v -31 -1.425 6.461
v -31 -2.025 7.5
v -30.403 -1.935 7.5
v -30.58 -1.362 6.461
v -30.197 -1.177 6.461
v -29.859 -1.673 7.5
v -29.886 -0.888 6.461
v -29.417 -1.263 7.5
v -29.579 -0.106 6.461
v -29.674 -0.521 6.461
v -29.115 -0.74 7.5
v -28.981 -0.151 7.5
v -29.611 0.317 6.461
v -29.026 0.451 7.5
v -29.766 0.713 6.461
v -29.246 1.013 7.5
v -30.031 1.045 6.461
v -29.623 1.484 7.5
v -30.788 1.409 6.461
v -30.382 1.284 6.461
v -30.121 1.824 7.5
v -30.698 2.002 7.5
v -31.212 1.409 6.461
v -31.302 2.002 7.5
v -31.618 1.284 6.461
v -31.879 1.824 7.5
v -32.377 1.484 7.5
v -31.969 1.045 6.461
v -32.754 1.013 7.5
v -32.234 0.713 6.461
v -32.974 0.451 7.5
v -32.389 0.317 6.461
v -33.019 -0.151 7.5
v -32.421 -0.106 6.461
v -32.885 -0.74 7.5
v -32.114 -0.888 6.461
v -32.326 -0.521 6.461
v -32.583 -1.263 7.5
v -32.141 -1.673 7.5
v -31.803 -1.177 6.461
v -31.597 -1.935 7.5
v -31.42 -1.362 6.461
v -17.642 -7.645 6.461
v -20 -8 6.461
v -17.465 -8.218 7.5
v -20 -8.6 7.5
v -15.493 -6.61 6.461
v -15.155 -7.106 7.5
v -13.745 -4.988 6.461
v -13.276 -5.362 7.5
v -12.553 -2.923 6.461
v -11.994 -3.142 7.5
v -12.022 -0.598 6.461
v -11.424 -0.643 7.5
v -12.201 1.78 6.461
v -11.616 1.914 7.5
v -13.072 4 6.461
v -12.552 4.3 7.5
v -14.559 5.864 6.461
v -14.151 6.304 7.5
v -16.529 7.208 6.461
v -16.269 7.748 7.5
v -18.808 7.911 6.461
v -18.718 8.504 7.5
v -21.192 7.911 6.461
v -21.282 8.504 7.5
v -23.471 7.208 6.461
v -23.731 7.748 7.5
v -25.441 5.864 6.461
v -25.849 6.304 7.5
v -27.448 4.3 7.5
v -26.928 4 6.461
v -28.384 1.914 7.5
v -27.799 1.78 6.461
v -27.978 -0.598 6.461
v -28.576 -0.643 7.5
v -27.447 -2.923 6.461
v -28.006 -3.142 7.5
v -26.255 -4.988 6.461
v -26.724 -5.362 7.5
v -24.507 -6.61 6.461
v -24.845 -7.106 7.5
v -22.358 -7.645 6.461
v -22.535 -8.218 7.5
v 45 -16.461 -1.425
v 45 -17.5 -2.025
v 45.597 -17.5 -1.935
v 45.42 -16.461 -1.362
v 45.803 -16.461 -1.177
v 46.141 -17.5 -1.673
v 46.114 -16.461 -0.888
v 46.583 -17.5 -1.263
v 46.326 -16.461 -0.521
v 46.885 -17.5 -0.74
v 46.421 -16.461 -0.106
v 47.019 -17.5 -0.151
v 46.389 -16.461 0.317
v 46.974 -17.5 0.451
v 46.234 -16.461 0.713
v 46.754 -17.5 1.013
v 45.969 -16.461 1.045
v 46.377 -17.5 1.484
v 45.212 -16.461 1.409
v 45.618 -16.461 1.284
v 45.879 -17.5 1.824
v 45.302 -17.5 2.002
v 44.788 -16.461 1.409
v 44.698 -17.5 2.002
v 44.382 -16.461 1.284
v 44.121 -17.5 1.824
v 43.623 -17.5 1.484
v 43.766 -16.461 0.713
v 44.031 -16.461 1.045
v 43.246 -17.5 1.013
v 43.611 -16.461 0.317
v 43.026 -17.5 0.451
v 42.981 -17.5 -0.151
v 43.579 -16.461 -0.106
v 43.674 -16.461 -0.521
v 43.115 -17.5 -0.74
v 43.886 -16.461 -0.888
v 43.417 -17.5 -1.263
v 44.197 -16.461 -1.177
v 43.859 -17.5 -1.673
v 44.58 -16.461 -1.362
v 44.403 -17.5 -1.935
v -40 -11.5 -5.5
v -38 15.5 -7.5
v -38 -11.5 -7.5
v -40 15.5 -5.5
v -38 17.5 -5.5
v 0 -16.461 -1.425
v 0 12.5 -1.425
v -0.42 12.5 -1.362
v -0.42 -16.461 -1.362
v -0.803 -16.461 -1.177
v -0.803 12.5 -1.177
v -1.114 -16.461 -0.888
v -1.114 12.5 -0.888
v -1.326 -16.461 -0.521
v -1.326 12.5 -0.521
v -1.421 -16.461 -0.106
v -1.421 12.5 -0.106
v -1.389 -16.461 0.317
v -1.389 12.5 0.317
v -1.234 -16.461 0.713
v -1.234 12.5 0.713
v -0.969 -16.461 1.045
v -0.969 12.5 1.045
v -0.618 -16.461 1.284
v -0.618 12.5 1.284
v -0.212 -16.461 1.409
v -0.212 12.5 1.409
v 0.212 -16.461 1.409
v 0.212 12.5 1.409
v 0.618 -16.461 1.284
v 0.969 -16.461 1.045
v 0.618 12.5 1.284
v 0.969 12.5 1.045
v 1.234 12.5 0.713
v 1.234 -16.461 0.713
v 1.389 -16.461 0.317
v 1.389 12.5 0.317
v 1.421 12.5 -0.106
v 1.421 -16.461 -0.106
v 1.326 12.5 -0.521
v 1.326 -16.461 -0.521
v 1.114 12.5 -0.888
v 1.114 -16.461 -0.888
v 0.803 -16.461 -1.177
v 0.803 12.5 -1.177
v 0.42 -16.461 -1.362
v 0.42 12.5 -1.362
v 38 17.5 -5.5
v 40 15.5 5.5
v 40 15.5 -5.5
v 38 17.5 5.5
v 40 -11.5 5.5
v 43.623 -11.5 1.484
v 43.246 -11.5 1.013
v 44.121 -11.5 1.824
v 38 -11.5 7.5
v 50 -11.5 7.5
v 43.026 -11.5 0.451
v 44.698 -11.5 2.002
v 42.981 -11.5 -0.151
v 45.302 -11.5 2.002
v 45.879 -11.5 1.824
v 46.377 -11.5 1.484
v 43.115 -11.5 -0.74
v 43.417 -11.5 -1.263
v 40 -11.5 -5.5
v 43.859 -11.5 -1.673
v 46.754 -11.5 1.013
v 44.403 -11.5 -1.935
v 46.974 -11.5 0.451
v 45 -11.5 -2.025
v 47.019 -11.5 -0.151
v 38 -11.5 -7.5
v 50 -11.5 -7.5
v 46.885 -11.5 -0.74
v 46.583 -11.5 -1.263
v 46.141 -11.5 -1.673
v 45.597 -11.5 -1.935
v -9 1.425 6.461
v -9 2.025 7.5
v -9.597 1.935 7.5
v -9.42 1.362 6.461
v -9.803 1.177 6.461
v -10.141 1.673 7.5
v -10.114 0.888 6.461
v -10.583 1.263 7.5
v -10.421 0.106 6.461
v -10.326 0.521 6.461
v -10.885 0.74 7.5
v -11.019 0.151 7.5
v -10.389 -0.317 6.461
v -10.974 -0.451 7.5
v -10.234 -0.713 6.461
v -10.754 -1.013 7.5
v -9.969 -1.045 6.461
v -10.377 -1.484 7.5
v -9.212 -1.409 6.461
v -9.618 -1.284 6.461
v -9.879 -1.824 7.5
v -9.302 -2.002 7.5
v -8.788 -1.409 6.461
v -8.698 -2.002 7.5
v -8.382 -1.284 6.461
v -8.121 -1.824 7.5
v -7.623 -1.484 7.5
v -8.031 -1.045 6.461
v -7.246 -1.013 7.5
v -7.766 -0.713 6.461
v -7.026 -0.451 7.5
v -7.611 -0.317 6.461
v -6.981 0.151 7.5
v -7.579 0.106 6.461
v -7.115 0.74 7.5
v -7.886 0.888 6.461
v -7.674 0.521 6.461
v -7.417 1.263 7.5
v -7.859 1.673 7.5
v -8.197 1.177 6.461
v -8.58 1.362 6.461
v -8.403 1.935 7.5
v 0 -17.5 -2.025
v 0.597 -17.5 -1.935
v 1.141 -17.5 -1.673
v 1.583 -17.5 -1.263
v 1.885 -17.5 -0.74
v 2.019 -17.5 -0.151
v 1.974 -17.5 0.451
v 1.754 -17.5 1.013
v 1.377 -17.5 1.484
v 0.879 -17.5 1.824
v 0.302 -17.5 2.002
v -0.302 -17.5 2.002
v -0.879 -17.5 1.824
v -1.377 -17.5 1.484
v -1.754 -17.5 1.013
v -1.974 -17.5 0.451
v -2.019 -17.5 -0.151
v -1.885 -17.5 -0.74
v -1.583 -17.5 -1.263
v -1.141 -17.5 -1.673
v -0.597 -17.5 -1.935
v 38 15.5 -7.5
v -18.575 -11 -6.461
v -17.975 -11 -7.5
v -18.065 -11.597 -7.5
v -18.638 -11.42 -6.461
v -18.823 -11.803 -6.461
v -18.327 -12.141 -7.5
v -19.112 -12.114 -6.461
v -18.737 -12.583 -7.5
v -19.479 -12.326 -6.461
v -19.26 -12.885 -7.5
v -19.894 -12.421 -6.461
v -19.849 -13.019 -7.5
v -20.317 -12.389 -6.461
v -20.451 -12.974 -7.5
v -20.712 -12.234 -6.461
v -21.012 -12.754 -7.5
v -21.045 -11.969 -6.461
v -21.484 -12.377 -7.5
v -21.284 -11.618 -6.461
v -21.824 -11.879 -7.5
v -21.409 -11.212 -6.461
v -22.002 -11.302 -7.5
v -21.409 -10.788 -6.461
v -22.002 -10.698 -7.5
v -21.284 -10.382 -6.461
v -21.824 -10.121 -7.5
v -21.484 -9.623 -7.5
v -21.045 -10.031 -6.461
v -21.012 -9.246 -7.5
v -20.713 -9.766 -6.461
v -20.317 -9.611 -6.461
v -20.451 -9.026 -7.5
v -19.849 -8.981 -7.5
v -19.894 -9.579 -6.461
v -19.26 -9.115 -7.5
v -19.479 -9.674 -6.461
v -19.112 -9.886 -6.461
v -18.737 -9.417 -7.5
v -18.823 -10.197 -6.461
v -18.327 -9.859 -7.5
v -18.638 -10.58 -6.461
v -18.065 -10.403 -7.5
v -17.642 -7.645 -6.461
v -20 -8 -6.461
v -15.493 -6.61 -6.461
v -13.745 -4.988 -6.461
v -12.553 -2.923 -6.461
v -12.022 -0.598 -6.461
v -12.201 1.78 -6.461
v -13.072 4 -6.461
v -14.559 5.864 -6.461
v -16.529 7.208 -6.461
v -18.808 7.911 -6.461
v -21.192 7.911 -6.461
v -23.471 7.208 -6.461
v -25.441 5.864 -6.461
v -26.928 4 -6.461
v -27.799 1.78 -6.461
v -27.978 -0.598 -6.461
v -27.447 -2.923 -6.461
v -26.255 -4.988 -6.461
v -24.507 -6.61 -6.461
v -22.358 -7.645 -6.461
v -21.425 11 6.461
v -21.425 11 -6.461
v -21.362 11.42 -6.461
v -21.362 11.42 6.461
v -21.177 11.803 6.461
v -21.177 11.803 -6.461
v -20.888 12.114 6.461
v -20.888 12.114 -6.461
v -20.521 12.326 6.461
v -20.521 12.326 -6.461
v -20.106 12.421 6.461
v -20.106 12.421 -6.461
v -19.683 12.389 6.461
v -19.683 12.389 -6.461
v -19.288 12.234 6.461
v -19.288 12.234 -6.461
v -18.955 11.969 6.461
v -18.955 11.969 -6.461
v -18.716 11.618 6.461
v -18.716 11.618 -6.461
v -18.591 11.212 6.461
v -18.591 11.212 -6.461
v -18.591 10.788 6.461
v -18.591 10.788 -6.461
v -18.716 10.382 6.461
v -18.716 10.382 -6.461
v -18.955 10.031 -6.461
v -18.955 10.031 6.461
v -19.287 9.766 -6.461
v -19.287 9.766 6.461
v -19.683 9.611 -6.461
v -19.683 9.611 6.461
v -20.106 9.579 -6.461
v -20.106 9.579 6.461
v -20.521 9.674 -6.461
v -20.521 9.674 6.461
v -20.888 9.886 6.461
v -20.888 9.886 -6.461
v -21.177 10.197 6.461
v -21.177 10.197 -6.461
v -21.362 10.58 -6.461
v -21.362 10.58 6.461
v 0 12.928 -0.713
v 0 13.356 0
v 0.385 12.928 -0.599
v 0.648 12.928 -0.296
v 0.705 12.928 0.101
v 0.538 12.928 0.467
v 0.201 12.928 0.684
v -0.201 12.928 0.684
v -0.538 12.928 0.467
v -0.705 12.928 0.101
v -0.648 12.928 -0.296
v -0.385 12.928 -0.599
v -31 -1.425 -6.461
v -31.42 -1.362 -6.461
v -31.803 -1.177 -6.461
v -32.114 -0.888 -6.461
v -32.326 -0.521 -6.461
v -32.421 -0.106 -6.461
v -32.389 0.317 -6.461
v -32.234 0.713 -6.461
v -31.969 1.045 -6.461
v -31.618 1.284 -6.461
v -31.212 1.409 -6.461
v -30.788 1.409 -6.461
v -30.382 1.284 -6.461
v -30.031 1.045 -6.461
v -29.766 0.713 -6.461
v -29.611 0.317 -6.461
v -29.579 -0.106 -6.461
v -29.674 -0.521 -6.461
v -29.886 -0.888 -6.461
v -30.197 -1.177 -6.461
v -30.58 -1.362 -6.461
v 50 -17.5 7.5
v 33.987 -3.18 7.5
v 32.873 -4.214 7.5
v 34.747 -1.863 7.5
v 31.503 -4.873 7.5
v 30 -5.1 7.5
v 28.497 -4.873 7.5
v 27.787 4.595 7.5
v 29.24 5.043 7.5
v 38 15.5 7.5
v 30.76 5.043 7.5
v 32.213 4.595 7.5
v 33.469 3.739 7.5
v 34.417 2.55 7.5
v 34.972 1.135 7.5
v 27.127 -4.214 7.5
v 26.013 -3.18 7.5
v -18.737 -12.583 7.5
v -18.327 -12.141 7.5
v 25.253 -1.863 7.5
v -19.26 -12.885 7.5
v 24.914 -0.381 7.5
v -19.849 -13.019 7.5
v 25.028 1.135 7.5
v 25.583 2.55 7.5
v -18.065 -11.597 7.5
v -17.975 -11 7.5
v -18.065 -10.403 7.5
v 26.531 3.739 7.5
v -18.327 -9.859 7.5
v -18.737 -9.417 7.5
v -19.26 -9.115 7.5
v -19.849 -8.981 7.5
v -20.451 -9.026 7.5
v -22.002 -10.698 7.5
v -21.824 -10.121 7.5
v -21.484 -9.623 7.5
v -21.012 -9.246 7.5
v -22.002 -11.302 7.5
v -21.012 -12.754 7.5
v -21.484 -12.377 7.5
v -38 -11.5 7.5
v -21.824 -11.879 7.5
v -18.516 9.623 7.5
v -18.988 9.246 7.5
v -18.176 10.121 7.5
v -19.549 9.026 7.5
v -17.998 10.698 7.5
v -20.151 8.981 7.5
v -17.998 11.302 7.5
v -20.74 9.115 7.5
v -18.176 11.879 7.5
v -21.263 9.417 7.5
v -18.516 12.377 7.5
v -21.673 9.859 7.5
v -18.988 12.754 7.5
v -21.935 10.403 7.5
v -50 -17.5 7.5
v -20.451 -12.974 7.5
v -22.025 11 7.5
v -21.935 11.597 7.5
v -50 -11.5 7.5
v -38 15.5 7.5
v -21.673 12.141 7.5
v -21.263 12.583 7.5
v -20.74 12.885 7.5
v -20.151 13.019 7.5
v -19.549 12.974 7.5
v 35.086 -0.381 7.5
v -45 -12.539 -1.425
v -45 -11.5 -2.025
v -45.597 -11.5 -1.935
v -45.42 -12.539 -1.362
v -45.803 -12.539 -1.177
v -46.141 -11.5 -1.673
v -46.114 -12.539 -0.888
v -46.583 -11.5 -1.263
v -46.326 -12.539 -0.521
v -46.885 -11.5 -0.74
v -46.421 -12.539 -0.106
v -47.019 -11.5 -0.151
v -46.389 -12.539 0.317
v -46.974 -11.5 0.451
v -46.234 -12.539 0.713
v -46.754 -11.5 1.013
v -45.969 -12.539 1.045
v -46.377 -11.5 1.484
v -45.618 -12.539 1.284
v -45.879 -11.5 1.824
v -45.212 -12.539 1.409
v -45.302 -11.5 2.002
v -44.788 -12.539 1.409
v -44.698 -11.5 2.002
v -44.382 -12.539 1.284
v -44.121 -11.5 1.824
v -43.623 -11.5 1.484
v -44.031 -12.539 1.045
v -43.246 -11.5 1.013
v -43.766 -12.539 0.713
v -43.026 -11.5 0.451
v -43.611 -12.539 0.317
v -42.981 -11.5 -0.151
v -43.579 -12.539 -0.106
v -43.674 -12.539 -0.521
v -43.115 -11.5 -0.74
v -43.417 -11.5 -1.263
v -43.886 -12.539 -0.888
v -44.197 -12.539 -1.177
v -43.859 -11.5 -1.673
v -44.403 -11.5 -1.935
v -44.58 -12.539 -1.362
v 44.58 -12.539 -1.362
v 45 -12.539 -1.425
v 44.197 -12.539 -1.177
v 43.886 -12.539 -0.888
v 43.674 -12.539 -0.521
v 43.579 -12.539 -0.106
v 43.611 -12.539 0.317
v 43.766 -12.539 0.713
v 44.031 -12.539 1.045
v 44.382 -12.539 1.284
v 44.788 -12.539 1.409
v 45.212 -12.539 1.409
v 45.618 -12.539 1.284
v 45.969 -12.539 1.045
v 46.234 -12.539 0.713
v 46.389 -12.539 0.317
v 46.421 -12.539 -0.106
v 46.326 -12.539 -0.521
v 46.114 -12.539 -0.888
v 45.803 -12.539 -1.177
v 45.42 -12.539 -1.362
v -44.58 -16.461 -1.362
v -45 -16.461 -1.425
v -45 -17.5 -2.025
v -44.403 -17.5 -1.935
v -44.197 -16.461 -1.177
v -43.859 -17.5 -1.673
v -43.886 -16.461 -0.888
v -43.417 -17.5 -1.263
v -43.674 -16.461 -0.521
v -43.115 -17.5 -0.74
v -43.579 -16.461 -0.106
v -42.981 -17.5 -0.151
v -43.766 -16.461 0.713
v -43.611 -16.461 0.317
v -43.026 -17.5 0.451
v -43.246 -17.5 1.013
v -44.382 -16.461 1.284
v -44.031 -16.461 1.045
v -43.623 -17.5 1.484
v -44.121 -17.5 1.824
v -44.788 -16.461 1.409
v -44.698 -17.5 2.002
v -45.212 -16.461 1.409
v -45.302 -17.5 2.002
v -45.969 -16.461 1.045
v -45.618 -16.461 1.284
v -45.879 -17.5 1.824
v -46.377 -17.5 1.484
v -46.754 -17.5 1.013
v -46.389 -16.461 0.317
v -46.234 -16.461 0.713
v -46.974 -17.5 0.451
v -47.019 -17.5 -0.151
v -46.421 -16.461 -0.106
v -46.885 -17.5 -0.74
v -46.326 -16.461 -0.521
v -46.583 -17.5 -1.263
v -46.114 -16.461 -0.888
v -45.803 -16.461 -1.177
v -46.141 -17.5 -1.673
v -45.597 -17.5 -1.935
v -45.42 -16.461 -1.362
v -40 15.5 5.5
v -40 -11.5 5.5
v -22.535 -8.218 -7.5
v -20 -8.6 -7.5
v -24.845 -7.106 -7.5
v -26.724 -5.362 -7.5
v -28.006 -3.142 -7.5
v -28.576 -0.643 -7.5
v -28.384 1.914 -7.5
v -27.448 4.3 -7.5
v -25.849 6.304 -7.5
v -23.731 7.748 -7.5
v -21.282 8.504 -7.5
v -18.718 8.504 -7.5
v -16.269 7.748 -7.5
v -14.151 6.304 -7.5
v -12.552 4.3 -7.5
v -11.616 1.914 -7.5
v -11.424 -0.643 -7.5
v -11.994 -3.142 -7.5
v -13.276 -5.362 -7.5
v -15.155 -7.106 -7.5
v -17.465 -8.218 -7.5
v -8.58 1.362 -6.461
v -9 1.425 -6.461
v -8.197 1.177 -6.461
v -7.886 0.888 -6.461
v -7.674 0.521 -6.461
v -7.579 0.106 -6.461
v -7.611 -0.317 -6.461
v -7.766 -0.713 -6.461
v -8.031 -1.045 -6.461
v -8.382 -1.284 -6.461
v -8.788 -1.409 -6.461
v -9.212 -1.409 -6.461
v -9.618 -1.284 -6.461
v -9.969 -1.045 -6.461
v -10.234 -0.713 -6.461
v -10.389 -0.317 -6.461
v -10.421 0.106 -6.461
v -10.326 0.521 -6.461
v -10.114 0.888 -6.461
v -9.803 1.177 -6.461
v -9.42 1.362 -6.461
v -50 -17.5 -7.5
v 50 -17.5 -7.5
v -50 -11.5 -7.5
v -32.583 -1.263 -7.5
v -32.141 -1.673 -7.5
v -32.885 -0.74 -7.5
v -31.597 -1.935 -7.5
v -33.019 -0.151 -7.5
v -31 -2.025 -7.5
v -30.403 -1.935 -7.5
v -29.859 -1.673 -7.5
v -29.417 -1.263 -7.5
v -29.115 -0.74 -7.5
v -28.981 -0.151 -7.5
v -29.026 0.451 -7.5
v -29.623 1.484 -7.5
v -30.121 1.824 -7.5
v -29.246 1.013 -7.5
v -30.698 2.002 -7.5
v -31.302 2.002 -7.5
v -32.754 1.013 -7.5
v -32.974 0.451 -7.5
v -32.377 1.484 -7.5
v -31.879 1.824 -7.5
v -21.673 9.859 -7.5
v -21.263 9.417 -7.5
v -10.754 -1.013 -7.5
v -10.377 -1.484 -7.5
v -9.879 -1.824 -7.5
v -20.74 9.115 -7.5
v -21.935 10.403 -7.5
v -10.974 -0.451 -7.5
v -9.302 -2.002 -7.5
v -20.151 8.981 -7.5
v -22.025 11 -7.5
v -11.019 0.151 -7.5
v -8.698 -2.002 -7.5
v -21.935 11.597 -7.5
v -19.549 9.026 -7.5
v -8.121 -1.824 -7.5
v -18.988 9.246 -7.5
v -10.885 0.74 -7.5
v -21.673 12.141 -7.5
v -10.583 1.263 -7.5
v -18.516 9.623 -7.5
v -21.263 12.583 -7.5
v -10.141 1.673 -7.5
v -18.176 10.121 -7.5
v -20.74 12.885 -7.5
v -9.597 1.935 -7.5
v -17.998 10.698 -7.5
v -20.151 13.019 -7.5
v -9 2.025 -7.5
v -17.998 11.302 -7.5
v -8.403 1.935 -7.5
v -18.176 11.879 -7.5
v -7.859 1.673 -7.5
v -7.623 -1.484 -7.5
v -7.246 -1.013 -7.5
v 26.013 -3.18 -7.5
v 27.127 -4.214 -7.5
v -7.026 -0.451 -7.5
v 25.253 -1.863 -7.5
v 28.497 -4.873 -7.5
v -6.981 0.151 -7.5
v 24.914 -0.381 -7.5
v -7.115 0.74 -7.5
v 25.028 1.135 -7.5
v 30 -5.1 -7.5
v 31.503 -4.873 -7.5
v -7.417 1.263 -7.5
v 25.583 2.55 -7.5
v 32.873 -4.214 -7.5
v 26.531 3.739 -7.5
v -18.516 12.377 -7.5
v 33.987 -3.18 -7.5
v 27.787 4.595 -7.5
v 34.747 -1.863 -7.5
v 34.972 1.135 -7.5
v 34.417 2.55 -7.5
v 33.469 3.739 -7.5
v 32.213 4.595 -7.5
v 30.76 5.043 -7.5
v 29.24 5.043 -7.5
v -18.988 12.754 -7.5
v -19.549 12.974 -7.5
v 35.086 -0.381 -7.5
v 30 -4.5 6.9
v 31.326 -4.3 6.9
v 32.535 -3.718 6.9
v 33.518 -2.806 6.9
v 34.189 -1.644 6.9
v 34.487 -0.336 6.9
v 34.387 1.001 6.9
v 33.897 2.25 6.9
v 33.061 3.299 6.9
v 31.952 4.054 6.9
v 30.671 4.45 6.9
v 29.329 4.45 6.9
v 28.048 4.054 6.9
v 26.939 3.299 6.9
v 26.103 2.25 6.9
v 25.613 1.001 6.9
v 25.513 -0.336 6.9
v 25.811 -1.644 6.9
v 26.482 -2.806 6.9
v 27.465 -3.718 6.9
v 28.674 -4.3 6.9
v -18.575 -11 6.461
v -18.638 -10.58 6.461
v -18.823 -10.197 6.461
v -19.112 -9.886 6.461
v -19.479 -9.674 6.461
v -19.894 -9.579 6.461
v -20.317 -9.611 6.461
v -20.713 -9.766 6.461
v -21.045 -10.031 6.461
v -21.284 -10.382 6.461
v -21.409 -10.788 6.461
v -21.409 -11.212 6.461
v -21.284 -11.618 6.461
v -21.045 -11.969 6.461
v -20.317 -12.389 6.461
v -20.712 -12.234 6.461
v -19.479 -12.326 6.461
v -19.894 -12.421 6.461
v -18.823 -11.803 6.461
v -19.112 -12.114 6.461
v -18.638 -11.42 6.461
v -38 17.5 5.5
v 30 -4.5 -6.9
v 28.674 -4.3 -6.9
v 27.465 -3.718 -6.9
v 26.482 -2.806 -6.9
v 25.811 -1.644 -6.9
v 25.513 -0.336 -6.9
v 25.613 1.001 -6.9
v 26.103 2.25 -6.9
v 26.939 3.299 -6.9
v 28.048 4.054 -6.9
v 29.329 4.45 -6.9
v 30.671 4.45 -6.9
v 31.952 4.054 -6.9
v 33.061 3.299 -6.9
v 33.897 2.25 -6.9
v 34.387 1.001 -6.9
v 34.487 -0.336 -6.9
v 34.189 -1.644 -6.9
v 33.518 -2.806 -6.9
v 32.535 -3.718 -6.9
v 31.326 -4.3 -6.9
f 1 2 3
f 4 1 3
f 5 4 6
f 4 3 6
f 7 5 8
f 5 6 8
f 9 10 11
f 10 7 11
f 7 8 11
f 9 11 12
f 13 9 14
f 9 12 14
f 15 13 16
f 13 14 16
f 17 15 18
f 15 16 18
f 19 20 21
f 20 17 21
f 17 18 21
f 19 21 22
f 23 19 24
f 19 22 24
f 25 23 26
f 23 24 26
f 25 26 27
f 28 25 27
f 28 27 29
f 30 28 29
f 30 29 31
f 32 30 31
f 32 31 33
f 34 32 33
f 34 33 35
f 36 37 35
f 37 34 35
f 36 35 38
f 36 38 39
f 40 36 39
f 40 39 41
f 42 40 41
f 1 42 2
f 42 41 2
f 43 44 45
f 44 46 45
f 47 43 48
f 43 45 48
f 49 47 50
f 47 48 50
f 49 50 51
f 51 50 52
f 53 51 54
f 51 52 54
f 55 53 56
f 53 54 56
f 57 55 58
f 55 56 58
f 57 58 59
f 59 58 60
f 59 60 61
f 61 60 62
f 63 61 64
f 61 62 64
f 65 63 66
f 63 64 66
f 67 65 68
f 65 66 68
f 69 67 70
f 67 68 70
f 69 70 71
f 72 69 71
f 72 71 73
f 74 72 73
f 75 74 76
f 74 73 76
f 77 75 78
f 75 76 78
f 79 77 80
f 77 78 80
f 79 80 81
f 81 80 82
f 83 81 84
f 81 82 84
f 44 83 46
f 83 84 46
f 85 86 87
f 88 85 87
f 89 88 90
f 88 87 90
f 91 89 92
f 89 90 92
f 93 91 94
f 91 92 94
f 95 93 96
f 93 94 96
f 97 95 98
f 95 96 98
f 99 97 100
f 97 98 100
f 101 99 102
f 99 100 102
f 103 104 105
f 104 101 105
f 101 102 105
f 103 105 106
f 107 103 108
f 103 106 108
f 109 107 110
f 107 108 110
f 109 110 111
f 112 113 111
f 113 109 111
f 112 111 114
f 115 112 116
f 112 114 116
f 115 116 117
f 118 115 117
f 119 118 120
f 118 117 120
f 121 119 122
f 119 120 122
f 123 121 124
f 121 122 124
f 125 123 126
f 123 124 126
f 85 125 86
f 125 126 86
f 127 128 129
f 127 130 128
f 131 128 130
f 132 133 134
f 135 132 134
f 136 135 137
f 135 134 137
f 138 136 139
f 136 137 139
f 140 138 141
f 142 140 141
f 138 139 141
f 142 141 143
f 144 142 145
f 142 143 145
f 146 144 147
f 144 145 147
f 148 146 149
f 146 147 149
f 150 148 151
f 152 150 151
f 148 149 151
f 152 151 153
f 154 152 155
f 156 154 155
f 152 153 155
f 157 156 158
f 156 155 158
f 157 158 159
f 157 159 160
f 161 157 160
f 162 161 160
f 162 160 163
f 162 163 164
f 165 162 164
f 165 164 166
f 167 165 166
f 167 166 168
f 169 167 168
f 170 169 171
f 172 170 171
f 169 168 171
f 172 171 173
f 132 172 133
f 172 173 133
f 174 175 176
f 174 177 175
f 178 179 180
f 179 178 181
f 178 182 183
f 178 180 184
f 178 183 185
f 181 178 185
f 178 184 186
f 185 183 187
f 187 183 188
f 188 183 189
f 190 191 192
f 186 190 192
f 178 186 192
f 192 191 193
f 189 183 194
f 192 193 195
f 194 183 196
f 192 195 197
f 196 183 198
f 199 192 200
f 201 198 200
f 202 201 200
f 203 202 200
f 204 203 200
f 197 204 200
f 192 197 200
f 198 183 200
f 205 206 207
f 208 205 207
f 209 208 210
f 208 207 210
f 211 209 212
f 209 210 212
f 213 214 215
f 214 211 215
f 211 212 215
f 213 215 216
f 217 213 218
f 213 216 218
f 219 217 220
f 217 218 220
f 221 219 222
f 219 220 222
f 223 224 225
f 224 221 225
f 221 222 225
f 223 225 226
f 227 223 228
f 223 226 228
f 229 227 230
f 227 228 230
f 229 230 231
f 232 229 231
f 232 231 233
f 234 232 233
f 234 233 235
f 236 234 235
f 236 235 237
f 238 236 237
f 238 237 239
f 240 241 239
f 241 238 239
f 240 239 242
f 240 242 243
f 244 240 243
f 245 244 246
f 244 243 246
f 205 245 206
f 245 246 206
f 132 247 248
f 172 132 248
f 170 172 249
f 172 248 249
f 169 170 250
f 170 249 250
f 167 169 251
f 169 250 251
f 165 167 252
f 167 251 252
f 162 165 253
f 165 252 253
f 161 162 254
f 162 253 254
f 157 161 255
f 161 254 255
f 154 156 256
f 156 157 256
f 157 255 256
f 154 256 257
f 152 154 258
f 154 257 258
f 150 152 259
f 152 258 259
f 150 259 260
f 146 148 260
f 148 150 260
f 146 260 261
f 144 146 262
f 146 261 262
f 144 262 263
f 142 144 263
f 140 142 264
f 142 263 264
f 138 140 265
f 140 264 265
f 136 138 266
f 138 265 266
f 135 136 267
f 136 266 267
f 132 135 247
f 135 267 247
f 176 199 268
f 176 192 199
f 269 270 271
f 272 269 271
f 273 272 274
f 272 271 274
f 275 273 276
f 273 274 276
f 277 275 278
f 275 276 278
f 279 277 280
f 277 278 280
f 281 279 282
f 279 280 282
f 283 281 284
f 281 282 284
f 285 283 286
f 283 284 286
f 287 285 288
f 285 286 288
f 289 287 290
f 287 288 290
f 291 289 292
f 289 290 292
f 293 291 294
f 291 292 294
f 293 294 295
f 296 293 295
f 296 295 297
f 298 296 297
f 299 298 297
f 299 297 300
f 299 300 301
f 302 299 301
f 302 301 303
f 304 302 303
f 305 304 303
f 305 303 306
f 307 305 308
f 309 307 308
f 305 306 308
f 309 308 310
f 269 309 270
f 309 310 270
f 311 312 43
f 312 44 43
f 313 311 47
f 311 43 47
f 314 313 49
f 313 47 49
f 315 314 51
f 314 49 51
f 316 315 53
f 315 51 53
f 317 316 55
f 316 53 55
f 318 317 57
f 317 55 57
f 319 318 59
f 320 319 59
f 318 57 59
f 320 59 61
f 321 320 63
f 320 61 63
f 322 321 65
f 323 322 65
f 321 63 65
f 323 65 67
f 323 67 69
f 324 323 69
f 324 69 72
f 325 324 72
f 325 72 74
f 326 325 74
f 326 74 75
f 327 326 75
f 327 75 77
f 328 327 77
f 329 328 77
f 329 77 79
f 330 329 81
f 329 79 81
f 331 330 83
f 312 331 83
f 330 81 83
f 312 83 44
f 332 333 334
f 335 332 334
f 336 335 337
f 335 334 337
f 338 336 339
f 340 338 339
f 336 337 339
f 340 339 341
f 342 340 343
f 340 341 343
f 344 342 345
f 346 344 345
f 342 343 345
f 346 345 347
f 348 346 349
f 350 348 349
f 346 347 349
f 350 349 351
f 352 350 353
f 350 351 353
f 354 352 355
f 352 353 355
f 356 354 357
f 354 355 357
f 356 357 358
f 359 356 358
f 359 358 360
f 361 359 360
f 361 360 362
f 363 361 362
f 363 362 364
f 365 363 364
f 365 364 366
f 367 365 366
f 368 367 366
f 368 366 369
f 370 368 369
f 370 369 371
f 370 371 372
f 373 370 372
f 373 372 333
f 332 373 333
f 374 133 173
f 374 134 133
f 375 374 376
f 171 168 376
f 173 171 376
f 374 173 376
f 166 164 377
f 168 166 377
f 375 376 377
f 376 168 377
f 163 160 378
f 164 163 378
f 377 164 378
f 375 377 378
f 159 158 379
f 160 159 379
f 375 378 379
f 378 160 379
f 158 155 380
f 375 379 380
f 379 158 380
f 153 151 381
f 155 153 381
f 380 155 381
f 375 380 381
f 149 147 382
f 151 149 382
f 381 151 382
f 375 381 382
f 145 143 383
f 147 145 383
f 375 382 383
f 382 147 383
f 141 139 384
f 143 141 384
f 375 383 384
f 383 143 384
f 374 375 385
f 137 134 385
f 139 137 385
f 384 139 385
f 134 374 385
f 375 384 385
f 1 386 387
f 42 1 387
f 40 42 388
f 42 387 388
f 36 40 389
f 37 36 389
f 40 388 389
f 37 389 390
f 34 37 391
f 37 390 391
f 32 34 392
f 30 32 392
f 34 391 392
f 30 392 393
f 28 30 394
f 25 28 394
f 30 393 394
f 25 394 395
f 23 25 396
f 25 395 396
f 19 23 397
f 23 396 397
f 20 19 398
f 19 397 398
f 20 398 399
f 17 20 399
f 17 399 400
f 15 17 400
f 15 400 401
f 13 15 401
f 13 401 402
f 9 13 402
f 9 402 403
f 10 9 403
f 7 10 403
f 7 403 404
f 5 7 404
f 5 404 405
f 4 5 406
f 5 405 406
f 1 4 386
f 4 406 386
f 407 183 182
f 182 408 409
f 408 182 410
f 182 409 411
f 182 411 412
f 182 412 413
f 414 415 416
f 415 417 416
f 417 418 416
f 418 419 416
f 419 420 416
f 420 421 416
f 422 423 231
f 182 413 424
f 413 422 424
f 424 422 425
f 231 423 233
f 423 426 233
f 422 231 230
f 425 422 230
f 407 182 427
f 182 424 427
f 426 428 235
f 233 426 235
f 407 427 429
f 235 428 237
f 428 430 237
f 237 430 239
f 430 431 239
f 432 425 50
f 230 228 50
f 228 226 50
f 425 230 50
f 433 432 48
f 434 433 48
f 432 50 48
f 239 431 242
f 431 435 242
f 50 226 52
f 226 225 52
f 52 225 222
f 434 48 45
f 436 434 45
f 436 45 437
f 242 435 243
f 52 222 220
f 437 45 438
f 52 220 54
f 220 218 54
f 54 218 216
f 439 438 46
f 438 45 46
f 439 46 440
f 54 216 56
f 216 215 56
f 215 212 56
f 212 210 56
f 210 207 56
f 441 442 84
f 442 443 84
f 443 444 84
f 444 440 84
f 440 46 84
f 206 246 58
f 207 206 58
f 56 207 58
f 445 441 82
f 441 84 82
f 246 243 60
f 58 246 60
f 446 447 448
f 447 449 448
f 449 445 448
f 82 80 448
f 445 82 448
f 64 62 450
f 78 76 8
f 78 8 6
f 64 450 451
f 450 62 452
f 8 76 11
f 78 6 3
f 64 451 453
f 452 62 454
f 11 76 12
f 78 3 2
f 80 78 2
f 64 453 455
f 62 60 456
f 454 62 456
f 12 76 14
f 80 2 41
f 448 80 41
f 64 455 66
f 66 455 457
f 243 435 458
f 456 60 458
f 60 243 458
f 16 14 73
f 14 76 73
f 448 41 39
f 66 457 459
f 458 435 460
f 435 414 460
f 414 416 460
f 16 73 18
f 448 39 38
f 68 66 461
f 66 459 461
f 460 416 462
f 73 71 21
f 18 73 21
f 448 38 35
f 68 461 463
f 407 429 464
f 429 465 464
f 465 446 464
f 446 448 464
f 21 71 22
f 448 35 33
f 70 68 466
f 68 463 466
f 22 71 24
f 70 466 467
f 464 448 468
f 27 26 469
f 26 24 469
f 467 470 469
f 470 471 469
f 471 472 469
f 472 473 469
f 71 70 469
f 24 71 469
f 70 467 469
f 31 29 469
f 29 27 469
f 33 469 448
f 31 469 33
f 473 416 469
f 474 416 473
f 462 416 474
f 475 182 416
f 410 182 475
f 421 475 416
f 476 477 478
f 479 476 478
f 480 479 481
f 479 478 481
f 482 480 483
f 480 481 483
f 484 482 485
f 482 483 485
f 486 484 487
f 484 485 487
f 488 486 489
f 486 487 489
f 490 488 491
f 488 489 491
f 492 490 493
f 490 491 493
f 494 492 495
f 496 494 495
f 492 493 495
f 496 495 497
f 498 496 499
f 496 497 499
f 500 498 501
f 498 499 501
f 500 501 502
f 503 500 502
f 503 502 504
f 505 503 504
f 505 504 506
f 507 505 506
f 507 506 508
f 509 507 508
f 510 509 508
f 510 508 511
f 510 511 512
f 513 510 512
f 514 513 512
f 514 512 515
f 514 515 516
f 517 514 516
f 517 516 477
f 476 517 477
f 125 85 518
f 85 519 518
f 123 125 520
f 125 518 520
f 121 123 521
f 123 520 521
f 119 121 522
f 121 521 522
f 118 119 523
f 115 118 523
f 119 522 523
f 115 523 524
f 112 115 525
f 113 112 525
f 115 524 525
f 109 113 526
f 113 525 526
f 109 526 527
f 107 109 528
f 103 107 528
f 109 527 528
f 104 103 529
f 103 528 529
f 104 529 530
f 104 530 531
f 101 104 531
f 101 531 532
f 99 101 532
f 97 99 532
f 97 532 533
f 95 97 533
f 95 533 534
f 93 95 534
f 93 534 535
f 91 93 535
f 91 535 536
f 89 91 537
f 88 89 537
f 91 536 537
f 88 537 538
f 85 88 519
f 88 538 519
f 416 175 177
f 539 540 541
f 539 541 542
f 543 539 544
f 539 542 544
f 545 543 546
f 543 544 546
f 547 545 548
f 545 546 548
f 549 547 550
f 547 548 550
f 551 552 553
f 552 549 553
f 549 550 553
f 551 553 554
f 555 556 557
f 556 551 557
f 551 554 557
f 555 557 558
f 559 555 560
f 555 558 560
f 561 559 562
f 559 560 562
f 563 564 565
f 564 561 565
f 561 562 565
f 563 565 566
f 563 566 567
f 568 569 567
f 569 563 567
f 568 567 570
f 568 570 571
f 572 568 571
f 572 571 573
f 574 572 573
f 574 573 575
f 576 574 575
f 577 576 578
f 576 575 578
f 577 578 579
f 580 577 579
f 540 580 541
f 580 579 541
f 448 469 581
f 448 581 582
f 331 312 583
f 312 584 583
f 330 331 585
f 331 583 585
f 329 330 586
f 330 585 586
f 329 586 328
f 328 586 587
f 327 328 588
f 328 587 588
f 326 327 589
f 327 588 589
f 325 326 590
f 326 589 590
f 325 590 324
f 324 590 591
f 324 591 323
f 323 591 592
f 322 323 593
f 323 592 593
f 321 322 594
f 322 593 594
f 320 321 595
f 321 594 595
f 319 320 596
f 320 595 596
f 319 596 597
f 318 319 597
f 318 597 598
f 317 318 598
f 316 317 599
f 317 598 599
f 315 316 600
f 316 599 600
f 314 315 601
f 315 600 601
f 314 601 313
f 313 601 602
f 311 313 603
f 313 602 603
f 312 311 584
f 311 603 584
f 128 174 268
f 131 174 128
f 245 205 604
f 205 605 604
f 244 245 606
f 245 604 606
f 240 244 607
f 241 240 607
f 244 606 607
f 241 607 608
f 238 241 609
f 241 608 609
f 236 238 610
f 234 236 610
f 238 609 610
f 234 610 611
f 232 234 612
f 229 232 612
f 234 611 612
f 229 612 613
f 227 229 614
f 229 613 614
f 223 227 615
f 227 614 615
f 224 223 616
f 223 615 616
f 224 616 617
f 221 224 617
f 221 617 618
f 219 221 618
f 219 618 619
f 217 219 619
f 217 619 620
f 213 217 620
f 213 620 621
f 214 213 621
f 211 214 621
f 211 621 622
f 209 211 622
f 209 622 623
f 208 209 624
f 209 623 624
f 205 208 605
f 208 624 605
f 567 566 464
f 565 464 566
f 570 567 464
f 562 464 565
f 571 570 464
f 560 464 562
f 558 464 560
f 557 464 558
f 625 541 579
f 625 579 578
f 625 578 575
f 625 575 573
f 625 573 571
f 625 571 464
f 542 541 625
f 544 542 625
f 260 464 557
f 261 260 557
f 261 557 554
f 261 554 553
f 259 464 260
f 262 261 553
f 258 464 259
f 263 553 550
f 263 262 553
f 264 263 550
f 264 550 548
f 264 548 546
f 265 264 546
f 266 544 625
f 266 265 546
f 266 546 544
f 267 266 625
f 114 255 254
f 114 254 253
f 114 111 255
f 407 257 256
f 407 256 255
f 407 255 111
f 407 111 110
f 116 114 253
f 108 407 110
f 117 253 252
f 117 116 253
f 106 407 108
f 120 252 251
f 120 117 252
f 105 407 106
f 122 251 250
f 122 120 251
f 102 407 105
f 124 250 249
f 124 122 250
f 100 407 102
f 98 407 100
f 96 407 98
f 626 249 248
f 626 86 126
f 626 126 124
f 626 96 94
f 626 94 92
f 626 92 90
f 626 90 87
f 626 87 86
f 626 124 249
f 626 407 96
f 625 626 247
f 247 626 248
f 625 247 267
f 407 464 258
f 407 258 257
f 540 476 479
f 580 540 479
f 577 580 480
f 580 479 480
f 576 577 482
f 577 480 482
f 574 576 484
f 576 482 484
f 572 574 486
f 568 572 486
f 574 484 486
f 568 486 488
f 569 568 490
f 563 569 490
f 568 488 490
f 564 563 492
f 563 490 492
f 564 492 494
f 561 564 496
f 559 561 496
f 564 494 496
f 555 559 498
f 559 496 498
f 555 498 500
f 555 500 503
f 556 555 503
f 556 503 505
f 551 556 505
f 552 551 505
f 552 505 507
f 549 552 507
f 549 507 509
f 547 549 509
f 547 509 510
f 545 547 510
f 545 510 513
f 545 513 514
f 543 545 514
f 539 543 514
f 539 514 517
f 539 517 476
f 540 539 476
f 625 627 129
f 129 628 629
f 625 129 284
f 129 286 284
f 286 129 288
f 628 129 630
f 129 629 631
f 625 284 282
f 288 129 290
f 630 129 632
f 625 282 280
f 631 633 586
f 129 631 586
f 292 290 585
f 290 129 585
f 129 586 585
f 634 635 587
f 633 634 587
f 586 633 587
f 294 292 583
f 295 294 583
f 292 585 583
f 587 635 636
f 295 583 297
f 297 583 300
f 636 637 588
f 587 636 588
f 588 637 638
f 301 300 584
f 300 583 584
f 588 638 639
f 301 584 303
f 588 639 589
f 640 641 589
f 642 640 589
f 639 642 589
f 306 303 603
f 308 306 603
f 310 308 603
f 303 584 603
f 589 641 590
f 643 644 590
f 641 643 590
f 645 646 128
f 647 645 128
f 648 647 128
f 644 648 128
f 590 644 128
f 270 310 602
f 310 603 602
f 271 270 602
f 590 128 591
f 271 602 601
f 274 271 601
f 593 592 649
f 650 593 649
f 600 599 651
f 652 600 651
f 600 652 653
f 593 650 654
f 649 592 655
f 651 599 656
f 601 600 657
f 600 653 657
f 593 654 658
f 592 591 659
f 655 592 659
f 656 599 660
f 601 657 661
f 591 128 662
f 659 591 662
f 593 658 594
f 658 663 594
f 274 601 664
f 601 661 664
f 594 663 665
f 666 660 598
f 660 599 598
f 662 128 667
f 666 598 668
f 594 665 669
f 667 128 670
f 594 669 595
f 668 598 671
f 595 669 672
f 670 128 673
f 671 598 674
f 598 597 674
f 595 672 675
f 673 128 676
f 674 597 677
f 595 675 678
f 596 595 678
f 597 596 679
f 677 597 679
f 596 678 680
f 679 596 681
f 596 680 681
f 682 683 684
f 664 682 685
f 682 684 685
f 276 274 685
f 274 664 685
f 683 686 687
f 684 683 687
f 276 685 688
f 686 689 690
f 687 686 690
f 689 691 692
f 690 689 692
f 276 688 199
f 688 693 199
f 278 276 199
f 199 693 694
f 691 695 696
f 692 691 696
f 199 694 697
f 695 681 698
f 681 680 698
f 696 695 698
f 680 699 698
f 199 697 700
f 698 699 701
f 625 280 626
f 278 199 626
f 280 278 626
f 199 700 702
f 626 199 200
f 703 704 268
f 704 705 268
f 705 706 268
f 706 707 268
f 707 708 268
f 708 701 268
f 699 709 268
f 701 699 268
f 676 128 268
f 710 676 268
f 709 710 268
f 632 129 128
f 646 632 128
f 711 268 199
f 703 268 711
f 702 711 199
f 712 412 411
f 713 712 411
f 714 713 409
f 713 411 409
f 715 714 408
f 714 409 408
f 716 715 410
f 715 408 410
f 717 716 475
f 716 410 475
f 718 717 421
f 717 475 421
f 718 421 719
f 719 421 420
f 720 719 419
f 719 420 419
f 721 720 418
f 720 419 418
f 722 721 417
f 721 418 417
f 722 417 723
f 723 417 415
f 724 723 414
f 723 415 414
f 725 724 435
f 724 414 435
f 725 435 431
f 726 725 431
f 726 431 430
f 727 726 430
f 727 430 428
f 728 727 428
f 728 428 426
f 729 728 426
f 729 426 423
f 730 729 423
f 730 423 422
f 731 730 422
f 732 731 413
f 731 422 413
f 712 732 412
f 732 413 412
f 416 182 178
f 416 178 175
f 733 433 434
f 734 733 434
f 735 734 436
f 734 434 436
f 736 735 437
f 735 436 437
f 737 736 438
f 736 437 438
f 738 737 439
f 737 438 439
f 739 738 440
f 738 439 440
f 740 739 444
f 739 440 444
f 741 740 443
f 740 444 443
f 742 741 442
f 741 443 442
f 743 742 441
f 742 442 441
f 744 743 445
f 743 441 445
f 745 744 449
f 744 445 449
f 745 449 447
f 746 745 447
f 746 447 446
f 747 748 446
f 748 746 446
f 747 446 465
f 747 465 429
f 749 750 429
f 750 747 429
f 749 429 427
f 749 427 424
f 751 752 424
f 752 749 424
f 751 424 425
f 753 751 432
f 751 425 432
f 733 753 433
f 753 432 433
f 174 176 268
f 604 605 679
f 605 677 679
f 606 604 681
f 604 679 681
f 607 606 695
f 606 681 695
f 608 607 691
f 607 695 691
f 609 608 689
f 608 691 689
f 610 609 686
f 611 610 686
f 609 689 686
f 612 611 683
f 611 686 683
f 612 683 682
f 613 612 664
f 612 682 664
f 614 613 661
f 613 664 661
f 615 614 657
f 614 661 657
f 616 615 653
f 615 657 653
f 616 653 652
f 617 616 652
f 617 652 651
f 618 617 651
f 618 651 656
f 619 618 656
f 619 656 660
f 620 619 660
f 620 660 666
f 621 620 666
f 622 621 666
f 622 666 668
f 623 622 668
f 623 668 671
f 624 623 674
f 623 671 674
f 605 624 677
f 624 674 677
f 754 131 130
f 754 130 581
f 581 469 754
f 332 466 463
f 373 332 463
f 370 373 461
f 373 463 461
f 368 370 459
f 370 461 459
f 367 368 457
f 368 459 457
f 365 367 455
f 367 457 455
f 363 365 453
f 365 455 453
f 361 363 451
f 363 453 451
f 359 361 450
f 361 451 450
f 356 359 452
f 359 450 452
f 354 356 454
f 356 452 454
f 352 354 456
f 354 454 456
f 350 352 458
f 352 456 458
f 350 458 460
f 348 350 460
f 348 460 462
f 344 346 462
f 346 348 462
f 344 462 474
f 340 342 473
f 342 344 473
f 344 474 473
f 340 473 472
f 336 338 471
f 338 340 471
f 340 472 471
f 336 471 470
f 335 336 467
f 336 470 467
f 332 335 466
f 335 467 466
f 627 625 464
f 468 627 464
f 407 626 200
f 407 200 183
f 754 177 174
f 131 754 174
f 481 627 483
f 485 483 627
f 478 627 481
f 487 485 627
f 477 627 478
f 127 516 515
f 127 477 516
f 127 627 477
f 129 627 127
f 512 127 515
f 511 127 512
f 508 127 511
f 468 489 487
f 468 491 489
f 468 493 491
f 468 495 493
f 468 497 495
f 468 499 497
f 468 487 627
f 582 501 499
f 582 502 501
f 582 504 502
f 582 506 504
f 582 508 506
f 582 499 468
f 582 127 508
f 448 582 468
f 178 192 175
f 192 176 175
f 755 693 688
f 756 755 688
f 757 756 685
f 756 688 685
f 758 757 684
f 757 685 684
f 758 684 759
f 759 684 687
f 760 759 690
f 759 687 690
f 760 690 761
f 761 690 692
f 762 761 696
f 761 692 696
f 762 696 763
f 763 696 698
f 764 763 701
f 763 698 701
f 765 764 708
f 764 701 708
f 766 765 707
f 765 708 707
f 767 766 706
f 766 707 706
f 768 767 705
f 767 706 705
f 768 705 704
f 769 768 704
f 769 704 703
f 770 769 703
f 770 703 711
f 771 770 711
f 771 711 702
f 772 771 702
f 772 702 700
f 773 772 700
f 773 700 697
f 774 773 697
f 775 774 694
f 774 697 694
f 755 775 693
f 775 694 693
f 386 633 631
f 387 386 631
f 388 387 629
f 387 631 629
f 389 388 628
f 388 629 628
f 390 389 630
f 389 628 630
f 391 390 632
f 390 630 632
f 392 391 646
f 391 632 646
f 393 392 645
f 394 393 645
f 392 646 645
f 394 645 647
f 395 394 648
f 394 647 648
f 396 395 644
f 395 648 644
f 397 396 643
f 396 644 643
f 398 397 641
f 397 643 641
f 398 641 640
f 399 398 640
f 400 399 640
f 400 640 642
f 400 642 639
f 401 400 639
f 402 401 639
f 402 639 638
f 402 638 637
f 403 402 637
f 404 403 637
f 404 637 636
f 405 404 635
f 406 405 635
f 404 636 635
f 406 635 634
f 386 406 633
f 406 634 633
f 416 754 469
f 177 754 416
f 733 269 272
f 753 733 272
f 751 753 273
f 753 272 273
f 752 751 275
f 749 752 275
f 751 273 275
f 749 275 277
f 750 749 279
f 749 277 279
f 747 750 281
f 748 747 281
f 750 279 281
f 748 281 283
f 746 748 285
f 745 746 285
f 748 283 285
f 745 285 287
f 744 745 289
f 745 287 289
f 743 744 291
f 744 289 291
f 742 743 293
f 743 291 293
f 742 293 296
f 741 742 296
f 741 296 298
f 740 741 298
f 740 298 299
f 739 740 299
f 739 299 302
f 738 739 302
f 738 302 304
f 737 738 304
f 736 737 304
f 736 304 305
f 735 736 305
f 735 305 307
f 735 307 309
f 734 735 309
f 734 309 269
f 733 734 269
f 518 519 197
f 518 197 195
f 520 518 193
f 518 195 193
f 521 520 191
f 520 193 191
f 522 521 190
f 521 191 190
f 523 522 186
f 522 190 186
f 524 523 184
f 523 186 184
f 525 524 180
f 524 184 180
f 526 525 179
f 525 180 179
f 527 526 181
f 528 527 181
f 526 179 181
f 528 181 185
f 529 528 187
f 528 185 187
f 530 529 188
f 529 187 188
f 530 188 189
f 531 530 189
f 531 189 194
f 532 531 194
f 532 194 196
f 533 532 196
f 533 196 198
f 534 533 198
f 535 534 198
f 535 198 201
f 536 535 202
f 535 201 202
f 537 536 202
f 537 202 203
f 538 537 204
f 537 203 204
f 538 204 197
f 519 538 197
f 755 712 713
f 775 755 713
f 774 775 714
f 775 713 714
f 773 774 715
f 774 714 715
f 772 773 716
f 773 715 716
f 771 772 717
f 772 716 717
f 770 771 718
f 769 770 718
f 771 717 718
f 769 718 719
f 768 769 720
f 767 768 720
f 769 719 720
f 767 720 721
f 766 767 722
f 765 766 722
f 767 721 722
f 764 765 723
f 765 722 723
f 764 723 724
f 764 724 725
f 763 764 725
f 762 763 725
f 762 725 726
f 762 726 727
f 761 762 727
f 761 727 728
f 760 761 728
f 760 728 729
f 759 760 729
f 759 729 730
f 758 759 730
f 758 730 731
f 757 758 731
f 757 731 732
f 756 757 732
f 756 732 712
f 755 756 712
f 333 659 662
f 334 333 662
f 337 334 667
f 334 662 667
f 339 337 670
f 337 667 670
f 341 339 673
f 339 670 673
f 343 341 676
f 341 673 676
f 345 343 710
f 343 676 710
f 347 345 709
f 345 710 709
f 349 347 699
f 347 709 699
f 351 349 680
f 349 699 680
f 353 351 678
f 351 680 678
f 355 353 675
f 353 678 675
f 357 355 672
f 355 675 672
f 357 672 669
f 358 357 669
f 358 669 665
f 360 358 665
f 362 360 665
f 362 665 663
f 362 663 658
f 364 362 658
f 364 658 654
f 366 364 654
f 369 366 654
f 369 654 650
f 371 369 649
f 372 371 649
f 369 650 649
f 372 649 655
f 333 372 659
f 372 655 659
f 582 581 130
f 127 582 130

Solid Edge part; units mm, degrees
sketch "Sketch1" plane through (0, 0, 0) normal (0, -1, 0) x (1, 0, 0)
  line L0 (-40, -7.5) -> (40, -7.5)
  line L1 (40, -7.5) -> (40, 7.5)
  line L2 (40, 7.5) -> (-40, 7.5)
  line L3 (-40, 7.5) -> (-40, -7.5)
  dimension "D1" = 15
  dimension "D2" = 80
extrude "Protrusion1" add sketch "Sketch1" along normal mid plane 35
chamfer "Chamfer_1" distance 2 angle 45 8 edges at (40, 0, 7.5) (40, 17.5, 0) (40, 0, -7.5) (0, 17.5, 7.5) (0, 17.5, -7.5) (-40, 0, -7.5) (-40, 0, 7.5) (-40, 17.5, 0)
hole "Hole_1" at (-20, 0, 7.5) direction (0, 0, -1) diameter 16 end up to next start chamfer 0.6 start chamfer angle 30 end chamfer 0.6 end chamfer angle 30
hole "Hole_2" at (30, 0, 7.5) direction (0, 0, -1) diameter 9 end up to next start chamfer 0.6 start chamfer angle 45 end chamfer 0.6 end chamfer angle 45
sketch "Sketch2" plane through (0, -17.5, 0) normal (0, -1, 0) x (1, 0, 0)
  line L0 (-38, 7.5) -> (-38, -7.5)
  line L1 (-38, -7.5) -> (-50, -7.5)
  line L2 (-50, -7.5) -> (-50, 7.5)
  line L3 (-50, 7.5) -> (-38, 7.5)
  line L4 (38, 7.5) -> (38, -7.5)
  line L5 (38, -7.5) -> (50, -7.5)
  line L6 (50, -7.5) -> (50, 7.5)
  line L7 (50, 7.5) -> (38, 7.5)
  dimension "D1" = 100
extrude "ExtrudedProtrusion_2" add sketch "Sketch2" against normal blind 6
hole "Hole_3" at (-45, -17.5, 0) direction (0, 1, 0) diameter 2.85 depth 30 tip angle 118 start chamfer 0.6 start chamfer angle 30 end chamfer 0.6 end chamfer angle 30
hole "Hole1" at (45, -17.5, 0) direction (0, 1, 0) diameter 2.85 depth 30 tip angle 118 start chamfer 0.6 start chamfer angle 30 end chamfer 0.6 end chamfer angle 30
hole "Hole2" at (0, -17.5, 0) direction (0, 1, 0) diameter 2.85 depth 30 tip angle 118 start chamfer 0.6 start chamfer angle 30 end chamfer 0.6 end chamfer angle 30
hole "Hole_5" at (-31, 0, 7.5) direction (0, 0, -1) diameter 2.85 depth 30 tip angle 118 start chamfer 0.6 start chamfer angle 30 end chamfer 0.6 end chamfer angle 30
pattern_circular "Pattern2" count 4 over 360 about axis through (-20, 0, 6.4608) along (0, 0, 1) of "Hole_5"
properties material "Polyethylene, low density"
